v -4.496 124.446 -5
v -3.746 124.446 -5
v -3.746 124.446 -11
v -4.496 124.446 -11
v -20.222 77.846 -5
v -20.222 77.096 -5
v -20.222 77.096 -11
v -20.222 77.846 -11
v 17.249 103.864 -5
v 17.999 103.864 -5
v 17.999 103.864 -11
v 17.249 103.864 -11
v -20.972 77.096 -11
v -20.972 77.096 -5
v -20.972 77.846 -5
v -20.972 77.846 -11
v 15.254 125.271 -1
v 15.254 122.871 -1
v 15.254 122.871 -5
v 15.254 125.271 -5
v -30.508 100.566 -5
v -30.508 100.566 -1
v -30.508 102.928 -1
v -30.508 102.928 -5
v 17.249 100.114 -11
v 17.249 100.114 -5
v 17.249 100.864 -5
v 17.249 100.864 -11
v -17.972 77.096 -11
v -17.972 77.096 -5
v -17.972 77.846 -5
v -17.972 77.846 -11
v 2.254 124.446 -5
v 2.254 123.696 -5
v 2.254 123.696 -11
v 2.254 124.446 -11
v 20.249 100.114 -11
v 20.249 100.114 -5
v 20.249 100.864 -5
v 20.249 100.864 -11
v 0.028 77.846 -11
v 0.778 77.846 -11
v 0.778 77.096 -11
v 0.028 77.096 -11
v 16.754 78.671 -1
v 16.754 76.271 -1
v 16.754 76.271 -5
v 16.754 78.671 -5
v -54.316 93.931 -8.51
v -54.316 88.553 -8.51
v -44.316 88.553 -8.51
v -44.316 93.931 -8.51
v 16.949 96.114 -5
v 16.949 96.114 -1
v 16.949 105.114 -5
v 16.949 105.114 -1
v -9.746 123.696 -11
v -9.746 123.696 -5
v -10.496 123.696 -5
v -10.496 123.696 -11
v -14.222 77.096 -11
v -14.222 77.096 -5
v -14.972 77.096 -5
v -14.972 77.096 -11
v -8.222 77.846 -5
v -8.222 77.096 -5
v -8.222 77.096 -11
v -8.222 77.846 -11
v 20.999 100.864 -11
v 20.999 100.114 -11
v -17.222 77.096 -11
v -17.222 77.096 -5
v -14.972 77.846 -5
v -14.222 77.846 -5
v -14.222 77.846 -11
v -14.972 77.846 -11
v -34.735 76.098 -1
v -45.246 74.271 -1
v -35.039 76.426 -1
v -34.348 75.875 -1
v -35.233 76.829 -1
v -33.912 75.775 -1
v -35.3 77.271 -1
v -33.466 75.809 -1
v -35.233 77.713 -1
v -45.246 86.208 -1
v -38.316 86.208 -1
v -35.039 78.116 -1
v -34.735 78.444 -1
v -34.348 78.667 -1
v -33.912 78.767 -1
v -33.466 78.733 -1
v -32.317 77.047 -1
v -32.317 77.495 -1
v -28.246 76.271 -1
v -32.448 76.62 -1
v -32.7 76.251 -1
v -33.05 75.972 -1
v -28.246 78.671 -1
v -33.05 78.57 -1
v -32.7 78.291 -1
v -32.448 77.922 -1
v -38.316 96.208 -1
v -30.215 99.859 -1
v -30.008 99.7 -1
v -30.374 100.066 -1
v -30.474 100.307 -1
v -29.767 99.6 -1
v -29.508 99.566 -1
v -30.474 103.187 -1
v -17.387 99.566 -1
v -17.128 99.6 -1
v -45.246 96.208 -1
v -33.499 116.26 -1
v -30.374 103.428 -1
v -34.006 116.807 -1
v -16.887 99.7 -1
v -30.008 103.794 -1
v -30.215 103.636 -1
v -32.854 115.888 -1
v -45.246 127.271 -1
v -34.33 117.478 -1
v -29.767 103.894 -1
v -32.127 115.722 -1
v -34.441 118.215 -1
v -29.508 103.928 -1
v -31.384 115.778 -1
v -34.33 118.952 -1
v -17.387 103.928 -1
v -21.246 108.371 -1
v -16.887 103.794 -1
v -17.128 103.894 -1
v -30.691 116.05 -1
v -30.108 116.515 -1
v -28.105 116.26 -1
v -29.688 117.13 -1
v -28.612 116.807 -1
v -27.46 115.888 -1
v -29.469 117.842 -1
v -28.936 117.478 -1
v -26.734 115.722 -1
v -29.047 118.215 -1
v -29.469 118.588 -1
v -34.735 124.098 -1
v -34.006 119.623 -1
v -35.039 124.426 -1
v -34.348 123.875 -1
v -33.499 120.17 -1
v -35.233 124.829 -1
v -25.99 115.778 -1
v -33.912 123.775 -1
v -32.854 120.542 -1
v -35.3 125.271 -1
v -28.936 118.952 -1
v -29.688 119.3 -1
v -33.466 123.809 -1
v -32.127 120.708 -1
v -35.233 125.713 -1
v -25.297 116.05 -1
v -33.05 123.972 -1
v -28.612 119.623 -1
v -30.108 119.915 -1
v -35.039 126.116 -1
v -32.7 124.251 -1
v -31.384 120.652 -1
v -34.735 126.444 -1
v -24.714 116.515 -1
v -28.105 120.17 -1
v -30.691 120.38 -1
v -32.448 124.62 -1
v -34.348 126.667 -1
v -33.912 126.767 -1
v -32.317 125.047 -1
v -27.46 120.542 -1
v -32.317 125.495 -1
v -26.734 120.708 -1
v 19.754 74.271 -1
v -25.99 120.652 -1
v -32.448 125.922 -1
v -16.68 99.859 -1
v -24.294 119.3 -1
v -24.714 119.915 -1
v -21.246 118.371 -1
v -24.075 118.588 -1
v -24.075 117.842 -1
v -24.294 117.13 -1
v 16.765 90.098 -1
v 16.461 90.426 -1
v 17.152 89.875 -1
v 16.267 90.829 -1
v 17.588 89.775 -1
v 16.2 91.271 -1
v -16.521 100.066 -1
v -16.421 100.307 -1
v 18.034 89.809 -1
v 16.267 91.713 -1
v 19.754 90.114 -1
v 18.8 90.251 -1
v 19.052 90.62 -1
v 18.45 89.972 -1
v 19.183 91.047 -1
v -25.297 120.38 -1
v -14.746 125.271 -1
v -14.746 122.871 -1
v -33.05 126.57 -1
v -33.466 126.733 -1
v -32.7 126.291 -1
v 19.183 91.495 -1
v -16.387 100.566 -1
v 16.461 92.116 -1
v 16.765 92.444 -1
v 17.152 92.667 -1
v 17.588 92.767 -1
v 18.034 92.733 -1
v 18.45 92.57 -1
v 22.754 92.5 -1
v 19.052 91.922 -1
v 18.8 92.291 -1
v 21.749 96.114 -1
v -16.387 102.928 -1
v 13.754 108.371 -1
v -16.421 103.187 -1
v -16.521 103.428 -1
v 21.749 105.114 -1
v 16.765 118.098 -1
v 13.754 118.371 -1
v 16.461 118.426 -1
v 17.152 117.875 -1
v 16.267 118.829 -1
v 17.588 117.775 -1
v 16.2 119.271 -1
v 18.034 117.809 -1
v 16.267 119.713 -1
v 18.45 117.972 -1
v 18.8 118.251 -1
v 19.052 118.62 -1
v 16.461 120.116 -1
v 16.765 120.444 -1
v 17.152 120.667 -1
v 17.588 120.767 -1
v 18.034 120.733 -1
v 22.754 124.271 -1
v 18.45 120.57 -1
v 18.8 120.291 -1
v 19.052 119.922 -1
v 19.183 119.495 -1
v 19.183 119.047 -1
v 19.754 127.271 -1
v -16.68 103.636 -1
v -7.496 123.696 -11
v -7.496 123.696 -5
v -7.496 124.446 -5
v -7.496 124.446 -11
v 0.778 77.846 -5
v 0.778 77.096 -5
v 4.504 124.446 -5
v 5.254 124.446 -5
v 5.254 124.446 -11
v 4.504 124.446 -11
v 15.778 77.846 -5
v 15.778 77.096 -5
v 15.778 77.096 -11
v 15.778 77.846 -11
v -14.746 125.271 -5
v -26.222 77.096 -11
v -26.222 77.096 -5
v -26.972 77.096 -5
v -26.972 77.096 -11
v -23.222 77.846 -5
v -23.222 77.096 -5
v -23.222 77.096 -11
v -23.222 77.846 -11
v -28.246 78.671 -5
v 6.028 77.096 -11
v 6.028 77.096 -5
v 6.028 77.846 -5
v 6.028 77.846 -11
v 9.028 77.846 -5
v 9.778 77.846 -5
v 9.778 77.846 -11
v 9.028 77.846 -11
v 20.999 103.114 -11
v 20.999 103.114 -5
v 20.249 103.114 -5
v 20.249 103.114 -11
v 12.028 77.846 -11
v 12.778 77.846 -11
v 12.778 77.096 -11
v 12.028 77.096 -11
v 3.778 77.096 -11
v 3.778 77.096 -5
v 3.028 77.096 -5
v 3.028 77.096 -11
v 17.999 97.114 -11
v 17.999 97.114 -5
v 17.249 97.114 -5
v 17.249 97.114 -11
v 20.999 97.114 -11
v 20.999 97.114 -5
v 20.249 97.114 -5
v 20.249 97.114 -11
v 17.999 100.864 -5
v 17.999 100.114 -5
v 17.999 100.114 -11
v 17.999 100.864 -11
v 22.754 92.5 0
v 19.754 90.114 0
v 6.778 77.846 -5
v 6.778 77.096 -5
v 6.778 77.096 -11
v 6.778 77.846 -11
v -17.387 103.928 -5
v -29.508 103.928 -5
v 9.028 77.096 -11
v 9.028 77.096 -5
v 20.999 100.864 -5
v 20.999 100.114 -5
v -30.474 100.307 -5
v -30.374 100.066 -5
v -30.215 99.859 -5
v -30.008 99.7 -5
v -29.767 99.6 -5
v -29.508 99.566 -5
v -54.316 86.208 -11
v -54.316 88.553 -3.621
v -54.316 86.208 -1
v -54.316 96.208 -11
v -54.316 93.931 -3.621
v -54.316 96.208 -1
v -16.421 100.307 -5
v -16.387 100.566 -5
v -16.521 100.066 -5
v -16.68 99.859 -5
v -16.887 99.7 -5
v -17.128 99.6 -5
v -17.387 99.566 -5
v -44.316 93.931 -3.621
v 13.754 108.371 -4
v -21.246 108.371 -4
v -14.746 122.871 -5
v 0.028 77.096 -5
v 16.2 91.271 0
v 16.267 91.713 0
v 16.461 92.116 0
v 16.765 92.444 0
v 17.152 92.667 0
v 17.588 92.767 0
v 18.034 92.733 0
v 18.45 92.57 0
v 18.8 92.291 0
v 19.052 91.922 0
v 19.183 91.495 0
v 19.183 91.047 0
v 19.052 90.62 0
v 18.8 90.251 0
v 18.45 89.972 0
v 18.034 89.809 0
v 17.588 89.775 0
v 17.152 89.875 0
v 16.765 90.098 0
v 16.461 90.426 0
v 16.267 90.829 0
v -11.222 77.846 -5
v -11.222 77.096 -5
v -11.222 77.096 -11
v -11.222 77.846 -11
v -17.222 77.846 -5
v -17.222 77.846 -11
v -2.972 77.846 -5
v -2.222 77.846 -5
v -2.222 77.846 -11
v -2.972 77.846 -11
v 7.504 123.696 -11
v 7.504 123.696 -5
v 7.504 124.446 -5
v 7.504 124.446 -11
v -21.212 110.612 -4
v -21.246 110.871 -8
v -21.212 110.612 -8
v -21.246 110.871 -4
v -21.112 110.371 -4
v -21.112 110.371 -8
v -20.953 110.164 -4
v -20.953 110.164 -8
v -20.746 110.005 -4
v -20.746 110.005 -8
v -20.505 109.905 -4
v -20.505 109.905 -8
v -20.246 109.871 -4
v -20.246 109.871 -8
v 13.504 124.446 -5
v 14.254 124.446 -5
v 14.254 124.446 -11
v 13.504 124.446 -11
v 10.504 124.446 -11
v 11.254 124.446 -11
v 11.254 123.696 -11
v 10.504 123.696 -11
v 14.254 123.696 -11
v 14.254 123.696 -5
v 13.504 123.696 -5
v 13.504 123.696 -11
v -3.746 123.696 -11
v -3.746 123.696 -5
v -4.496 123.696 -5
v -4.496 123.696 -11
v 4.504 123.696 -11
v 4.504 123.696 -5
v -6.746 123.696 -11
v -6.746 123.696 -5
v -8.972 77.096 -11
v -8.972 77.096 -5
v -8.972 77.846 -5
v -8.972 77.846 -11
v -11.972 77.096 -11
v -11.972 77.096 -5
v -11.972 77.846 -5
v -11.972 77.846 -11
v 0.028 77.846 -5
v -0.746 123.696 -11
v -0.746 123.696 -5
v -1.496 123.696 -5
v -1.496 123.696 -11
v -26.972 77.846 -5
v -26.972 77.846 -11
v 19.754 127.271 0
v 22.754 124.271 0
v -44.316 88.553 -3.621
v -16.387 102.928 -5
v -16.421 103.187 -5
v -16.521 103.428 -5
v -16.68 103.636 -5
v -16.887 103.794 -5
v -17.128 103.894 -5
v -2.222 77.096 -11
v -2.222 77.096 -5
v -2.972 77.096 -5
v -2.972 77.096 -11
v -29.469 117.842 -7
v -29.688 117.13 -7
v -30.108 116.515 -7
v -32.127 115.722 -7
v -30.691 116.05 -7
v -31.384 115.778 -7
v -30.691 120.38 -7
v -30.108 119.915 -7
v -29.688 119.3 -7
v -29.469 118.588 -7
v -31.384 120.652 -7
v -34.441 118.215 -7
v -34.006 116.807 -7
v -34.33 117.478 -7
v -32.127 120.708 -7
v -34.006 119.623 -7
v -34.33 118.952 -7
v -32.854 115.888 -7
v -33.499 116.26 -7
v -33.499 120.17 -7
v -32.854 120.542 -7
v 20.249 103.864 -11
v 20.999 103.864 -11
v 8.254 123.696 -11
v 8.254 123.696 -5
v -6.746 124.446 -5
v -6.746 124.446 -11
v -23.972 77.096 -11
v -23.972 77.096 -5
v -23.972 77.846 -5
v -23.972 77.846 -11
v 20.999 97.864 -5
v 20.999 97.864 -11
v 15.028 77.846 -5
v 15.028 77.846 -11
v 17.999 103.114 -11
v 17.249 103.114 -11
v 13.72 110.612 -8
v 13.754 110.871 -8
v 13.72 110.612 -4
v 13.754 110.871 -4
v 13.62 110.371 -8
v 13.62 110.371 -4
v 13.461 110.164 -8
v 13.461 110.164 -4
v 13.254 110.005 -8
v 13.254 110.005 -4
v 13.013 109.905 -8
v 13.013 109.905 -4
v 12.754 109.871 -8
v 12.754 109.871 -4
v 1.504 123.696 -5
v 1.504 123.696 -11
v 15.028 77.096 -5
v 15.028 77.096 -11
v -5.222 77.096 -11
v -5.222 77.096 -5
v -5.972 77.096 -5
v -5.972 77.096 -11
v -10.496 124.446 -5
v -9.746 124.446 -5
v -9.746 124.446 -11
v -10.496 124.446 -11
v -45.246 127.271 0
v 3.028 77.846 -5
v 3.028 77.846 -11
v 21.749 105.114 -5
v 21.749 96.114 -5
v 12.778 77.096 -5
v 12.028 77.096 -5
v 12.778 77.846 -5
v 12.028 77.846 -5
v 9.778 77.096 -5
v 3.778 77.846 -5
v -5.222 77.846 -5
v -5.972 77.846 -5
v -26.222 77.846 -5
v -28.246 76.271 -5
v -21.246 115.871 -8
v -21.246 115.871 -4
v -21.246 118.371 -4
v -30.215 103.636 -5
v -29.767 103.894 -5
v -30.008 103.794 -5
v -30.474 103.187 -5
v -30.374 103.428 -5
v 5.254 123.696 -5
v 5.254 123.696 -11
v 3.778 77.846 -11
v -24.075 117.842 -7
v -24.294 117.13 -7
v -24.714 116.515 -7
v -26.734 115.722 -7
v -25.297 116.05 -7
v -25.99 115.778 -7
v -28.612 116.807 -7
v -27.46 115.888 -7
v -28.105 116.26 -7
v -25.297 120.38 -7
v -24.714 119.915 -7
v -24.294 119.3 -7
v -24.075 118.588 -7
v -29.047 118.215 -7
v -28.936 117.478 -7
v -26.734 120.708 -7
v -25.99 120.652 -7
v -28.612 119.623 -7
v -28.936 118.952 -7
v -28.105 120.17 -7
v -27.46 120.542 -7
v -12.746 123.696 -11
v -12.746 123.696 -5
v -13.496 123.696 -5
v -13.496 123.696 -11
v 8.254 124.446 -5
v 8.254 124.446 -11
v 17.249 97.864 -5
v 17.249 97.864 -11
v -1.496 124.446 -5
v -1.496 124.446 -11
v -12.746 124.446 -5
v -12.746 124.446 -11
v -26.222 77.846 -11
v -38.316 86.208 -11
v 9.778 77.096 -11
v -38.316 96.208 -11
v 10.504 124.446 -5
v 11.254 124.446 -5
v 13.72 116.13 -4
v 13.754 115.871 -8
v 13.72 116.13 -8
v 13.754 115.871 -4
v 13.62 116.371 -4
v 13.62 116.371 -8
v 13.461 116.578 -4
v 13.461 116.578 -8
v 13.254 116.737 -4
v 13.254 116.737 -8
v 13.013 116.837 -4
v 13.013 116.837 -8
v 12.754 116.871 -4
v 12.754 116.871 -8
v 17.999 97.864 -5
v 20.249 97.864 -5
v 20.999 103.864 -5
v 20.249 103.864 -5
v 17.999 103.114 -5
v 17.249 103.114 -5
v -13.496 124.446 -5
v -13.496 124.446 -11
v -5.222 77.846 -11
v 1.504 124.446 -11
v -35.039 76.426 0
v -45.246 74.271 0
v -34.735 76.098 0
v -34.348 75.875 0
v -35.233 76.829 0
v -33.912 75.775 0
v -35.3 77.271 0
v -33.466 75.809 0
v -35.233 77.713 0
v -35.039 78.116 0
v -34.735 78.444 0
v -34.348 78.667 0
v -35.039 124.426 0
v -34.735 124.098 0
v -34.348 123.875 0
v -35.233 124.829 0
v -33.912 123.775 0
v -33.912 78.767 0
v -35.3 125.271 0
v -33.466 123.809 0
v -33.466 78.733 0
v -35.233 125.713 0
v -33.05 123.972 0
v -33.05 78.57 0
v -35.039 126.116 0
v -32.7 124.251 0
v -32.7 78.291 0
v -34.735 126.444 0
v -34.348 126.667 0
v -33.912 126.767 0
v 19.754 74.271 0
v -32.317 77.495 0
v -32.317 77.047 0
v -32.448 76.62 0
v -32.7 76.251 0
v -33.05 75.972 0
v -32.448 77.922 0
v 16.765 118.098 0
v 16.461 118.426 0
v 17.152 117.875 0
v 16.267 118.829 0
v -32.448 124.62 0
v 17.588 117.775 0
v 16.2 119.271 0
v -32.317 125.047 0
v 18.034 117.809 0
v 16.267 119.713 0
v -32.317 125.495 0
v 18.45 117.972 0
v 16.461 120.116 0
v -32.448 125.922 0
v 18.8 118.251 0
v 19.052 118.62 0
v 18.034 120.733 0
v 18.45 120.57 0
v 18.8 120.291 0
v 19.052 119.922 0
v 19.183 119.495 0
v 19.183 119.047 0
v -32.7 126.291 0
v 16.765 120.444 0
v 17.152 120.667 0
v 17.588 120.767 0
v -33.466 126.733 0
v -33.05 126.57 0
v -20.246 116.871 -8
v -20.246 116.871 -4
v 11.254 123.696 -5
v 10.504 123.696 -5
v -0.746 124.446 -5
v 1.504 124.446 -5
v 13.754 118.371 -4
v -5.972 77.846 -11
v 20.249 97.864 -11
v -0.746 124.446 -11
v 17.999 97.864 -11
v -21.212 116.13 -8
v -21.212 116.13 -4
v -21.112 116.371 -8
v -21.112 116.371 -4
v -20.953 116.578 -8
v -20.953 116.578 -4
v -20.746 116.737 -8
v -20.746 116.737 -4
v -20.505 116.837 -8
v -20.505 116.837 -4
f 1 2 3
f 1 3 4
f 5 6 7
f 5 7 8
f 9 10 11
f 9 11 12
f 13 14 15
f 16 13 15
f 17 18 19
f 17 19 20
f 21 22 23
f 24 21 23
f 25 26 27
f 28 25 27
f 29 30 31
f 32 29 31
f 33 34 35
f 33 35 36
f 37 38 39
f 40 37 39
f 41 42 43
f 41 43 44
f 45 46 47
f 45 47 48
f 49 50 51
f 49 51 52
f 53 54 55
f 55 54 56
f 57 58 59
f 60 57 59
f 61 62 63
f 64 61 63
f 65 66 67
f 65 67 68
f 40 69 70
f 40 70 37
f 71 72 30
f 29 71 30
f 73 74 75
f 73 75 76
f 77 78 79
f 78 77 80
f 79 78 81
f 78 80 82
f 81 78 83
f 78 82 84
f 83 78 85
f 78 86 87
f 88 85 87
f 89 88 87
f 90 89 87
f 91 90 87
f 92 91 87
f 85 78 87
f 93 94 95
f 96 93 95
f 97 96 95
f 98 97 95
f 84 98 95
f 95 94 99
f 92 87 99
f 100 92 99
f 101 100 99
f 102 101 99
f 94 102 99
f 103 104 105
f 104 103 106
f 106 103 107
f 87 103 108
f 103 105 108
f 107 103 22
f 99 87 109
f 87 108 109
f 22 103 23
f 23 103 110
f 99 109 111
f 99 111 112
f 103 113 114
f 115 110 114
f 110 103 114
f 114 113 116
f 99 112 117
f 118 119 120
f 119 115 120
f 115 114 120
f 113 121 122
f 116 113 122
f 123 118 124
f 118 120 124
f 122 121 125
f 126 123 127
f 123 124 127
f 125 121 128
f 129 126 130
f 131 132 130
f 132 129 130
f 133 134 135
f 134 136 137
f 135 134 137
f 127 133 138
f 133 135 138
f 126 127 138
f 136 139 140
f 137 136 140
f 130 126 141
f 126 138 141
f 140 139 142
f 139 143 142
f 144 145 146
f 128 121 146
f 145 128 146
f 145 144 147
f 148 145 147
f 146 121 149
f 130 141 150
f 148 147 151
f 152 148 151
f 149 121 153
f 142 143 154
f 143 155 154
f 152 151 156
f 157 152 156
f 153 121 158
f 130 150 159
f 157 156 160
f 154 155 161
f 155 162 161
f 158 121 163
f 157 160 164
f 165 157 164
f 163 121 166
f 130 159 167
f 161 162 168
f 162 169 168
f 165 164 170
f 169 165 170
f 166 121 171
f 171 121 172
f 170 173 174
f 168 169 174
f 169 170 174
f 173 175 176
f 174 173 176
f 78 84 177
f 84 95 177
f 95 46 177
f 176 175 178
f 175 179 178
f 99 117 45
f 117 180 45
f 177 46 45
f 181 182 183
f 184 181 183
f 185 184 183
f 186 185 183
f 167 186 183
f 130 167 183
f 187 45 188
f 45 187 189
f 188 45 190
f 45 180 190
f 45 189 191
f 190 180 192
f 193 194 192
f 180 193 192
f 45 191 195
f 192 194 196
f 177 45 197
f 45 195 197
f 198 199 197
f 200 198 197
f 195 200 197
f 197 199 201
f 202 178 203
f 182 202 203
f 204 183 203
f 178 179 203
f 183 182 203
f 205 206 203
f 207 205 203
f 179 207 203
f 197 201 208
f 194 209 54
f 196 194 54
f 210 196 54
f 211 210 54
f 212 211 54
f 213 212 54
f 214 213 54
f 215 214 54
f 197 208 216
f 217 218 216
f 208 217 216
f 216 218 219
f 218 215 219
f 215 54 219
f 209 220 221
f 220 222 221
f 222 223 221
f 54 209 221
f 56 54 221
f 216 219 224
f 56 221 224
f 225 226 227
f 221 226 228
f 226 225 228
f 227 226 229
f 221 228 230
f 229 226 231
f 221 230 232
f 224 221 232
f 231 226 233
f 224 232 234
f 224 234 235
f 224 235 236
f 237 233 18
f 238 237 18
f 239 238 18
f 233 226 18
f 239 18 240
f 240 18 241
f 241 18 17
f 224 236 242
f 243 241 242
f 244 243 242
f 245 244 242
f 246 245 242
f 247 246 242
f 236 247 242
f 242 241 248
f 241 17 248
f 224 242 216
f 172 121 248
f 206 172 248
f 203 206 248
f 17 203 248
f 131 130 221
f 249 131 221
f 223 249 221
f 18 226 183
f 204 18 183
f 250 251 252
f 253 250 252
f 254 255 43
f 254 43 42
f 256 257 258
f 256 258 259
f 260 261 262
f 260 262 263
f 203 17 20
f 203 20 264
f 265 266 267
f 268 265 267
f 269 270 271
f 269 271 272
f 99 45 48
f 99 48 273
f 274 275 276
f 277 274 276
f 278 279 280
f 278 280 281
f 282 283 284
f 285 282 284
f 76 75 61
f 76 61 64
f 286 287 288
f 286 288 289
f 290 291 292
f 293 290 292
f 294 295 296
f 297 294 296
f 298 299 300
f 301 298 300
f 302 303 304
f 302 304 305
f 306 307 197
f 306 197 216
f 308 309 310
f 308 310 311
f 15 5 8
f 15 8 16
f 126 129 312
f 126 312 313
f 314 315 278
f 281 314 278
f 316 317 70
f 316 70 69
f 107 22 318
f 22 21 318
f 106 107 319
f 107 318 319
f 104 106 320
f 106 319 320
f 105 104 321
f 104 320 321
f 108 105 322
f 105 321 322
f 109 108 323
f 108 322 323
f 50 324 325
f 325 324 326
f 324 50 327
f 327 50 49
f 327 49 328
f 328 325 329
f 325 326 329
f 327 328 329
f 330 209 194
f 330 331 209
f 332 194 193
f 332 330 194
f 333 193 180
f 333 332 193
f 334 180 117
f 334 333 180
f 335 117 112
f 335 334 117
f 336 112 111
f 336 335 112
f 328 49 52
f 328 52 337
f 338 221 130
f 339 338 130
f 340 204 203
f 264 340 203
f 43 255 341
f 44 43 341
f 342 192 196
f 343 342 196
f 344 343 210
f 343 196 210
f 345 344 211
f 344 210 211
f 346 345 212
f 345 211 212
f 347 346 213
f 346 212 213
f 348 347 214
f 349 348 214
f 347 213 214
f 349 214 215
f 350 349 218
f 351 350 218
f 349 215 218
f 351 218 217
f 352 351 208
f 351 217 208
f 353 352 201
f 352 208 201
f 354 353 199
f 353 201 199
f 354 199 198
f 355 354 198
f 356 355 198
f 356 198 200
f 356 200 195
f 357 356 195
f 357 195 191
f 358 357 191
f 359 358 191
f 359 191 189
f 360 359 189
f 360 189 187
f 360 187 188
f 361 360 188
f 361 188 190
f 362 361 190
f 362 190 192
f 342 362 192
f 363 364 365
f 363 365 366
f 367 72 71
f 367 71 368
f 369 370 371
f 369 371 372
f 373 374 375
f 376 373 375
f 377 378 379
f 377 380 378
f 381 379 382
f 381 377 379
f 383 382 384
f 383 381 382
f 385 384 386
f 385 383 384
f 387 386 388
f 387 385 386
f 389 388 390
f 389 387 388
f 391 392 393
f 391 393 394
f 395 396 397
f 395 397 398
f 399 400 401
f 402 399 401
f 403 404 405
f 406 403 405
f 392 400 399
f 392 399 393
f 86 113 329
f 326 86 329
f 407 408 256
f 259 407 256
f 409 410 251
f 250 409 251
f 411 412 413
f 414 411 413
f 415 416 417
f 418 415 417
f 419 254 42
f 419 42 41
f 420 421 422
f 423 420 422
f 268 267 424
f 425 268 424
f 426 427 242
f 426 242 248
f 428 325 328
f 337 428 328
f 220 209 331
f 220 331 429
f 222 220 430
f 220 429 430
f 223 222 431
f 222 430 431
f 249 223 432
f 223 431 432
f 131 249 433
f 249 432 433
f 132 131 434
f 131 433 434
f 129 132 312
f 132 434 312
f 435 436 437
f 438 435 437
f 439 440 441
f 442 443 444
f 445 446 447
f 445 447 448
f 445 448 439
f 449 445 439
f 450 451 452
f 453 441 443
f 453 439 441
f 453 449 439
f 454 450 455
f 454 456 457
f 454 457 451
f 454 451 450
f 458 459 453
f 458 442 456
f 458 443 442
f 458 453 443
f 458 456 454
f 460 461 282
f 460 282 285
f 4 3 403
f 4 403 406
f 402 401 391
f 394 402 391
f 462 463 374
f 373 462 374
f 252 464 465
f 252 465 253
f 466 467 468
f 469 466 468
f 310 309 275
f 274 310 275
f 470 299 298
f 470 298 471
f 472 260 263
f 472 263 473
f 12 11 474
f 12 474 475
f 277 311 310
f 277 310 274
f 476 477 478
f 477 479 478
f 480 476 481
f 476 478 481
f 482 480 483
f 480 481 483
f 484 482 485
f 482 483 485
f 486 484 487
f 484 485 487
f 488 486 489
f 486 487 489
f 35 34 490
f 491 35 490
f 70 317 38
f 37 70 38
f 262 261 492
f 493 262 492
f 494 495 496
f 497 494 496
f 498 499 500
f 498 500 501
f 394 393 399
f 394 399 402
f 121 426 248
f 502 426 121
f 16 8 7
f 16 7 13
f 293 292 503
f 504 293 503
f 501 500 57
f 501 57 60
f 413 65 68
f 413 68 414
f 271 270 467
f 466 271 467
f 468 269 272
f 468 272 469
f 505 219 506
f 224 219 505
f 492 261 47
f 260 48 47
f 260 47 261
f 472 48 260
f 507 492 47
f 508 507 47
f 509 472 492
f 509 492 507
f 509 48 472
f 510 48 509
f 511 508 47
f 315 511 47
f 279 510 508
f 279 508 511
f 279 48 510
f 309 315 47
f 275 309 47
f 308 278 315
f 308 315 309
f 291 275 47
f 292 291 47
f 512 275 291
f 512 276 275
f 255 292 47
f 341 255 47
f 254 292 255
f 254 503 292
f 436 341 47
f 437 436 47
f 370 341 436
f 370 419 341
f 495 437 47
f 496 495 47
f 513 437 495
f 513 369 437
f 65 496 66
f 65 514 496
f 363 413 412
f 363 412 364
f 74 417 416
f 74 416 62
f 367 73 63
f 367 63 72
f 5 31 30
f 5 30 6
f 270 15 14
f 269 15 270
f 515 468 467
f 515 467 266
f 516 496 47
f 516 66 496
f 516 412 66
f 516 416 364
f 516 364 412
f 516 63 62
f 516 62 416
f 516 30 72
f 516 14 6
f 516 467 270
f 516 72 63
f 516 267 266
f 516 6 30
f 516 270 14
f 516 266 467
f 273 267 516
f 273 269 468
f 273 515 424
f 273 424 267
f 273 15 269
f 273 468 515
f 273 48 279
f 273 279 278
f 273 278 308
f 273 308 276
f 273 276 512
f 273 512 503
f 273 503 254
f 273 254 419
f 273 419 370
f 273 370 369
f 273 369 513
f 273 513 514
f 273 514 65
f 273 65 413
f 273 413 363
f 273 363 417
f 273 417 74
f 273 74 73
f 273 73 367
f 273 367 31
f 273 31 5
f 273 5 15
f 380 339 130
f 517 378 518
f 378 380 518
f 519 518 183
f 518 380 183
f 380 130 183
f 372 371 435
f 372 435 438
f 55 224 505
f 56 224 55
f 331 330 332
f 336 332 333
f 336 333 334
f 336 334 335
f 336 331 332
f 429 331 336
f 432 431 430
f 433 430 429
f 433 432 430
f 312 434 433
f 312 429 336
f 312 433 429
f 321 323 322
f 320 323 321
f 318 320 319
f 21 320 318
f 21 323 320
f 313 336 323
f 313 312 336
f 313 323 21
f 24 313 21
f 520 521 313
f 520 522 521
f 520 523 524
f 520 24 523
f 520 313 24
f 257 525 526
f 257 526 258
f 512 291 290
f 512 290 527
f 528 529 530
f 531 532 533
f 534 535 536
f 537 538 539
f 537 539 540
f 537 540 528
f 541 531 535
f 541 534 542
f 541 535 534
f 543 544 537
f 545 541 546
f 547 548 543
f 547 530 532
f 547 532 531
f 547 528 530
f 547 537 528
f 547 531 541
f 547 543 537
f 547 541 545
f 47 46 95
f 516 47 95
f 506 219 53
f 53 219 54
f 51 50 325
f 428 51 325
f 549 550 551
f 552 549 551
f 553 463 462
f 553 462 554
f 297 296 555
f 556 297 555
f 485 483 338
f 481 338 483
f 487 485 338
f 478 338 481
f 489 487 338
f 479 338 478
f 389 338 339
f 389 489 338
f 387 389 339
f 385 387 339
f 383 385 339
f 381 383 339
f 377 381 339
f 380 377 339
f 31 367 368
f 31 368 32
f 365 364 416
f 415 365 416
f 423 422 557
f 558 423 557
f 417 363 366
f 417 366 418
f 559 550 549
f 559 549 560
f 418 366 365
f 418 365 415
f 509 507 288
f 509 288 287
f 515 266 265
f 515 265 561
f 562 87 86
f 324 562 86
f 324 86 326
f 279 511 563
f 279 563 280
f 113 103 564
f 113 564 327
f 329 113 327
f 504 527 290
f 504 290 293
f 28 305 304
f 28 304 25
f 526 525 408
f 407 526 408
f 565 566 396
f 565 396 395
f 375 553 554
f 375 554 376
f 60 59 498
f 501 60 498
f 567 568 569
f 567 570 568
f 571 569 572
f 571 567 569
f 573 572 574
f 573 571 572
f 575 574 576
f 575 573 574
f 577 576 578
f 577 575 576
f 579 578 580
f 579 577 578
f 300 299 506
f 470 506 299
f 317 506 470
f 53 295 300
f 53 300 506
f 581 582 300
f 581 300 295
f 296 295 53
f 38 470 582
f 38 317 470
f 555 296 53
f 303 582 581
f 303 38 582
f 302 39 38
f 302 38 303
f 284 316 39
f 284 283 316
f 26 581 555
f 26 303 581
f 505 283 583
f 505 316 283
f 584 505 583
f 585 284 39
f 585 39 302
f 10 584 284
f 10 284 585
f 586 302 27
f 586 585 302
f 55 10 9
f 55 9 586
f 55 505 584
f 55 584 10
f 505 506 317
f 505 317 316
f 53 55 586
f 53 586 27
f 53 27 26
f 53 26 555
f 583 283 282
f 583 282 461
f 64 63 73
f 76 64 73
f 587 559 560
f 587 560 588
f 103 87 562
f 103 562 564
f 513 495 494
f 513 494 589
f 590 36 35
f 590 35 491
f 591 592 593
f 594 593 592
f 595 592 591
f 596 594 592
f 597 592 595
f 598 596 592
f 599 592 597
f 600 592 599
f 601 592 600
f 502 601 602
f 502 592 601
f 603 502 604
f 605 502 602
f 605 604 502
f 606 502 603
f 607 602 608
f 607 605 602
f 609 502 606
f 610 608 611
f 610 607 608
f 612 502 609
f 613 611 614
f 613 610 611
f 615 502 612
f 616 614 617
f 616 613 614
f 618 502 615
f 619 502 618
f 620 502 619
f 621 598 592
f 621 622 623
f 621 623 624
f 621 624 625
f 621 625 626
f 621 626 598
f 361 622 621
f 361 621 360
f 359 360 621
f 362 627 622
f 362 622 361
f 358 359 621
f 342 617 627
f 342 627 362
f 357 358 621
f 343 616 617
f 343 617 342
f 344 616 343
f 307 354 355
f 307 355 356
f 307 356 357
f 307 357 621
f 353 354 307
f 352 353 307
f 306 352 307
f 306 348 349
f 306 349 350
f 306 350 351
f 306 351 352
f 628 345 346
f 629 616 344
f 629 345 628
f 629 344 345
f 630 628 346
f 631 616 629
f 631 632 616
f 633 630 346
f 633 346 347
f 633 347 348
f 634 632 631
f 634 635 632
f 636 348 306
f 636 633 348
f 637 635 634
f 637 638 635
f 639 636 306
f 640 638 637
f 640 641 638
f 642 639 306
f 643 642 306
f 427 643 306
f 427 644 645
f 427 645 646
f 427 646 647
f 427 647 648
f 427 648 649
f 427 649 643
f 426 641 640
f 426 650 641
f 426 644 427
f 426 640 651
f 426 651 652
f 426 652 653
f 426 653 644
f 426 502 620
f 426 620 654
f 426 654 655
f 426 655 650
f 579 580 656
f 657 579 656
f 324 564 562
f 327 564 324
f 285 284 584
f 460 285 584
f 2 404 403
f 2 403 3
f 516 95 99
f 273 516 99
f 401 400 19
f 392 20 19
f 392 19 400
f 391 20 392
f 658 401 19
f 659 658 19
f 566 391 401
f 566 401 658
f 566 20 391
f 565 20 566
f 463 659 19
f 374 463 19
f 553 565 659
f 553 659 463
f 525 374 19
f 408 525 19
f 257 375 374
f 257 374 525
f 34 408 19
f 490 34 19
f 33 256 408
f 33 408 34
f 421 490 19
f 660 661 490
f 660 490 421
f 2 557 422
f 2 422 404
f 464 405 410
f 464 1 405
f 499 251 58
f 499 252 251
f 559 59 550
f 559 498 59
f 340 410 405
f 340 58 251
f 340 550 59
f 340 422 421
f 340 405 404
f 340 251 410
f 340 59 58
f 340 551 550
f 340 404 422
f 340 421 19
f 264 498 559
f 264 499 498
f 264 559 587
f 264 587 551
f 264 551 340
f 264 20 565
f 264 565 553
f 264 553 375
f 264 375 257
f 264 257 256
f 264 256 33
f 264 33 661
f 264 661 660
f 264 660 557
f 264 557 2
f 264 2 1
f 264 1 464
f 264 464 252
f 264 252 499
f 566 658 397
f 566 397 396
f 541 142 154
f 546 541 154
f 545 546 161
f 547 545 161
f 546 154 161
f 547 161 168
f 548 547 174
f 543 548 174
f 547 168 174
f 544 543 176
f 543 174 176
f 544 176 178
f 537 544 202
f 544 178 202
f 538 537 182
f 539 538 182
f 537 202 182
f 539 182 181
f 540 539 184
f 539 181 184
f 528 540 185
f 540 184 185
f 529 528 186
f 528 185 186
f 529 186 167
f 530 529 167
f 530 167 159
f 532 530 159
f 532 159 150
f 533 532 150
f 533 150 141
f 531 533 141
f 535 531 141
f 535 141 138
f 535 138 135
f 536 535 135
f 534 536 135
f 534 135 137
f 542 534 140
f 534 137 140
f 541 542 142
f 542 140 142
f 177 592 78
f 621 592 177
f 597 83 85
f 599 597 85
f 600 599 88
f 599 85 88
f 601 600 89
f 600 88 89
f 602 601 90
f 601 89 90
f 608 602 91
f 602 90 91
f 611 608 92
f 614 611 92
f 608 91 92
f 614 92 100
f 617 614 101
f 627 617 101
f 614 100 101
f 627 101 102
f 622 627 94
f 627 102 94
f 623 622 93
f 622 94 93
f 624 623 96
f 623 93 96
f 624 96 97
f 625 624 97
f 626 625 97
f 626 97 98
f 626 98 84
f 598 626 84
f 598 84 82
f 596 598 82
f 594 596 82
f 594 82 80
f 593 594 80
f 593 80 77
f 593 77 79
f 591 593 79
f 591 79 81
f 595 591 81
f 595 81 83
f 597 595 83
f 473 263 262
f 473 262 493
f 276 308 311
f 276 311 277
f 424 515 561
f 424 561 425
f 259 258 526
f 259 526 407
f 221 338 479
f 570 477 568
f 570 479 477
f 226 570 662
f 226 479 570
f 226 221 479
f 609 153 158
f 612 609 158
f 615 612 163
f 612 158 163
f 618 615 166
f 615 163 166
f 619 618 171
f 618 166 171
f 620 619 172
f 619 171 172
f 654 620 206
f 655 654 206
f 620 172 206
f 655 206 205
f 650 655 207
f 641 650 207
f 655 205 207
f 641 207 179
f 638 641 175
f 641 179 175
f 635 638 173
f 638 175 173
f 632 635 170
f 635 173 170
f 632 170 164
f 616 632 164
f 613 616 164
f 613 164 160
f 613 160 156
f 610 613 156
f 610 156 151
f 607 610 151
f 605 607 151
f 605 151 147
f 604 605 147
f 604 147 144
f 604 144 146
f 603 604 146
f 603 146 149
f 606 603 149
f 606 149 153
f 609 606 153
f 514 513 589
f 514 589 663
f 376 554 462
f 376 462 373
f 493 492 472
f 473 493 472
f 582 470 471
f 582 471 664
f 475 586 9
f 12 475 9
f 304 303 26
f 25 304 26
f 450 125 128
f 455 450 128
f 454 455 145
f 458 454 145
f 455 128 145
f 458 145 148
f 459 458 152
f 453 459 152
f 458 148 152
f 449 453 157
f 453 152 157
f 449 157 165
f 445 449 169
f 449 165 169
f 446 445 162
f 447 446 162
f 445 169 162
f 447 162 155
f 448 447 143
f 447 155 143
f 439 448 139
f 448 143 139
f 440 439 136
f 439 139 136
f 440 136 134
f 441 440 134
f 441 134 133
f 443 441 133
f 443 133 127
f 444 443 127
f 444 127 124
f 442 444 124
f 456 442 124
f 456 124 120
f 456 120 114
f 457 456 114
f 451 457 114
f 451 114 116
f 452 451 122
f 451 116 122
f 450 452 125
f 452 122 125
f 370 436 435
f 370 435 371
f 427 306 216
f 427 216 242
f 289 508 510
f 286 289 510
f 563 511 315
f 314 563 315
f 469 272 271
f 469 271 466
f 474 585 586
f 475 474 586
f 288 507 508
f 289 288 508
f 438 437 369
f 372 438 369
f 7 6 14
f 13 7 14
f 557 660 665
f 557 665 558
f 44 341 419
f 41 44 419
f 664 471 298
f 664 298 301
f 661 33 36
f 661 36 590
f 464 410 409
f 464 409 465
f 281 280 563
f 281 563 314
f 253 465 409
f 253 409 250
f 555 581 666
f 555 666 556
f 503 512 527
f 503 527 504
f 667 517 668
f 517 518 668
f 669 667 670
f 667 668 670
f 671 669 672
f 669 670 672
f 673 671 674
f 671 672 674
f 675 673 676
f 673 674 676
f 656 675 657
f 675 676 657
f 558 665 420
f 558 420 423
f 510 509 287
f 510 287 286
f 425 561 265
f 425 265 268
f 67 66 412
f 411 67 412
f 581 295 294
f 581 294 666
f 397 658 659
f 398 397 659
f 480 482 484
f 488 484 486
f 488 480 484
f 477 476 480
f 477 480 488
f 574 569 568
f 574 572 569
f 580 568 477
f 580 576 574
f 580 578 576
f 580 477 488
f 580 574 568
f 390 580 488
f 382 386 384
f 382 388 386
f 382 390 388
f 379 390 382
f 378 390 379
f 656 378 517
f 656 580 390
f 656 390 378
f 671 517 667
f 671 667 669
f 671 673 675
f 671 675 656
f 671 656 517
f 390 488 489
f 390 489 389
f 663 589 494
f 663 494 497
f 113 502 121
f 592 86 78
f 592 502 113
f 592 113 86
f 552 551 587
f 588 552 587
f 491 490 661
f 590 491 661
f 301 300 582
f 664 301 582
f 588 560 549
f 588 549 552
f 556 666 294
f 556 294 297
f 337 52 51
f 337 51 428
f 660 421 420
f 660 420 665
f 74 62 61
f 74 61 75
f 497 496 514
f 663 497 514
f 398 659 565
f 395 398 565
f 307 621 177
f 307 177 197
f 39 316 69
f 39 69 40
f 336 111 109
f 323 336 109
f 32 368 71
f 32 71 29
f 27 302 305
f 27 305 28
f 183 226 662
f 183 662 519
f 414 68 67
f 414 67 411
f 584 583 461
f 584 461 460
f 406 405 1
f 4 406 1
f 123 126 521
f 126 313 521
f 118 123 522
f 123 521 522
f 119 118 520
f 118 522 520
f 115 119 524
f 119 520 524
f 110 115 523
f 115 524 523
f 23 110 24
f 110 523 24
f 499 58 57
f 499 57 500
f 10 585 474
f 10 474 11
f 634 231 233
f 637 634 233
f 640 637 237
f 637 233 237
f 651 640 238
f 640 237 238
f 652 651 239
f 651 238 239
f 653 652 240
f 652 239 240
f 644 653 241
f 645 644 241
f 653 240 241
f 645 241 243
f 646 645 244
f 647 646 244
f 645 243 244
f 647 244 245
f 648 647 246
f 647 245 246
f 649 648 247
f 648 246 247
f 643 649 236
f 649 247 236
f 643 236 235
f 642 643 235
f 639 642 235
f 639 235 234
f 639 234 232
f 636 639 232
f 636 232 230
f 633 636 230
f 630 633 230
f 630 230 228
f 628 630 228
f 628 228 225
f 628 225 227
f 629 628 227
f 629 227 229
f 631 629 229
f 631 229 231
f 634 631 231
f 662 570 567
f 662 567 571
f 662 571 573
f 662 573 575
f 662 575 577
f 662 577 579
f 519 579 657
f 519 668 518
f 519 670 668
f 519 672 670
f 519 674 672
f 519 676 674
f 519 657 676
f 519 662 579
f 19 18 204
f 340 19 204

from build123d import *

# Parameters (mm, degrees)
BOSS_EXTRUDE1_DEPTH  = 1
SKETCH2_W            = 16
SKETCH2_H            = 10
BOSS_EXTRUDE2_DEPTH  = 10
SKETCH3_W            = 4.889113018
SKETCH3_H            = 5.37802432
CUT_EXTRUDE1_DEPTH   = 10
SKETCH4_W            = 45
SKETCH4_H            = 2.4
SKETCH4_W_2          = 30
BOSS_EXTRUDE3_DEPTH  = 4
SKETCH5_W            = 35
SKETCH5_H            = 10
BOSS_EXTRUDE4_DEPTH  = 7
SKETCH6_W            = 35
SKETCH6_H            = 1.5
CUT_EXTRUDE2_DEPTH   = 4
FILLET1_R            = 1
SKETCH7_R            = 1.5
CUT_EXTRUDE3_DEPTH   = 4
SKETCH8_W            = 0.75
SKETCH8_H            = 0.75
BOSS_EXTRUDE5_DEPTH  = 6
LPATTERN1_COUNT      = 10
LPATTERN1_PITCH      = 3
SKETCH9_W            = 0.75
SKETCH9_H            = 0.75
BOSS_EXTRUDE6_DEPTH  = 6
LPATTERN2_COUNT      = 15
LPATTERN2_PITCH      = 3
SKETCH10_R           = 2.5
BOSS_EXTRUDE7_DEPTH  = 6
SKETCH11_W           = 4.8
SKETCH11_H           = 9
BOSS_EXTRUDE8_DEPTH  = 4
SKETCH12_W           = 0.75
SKETCH12_H           = 0.75
BOSS_EXTRUDE9_DEPTH  = 6
LPATTERN3_COUNT      = 3
LPATTERN3_PITCH      = 3
LPATTERN3_COUNT_DIR2 = 2
LPATTERN3_PITCH_DIR2 = 3
SKETCH13_W           = 14.120912951
SKETCH13_H           = 4.362558473
BOSS_EXTRUDE10_DEPTH = 4
FILLET2_R            = 1


with BuildPart() as part:
    # Sketch1 → Boss-Extrude1 (new body)
    with BuildSketch(Plane.XY):
        Polygon((22.754016647, 124.270947632), (19.754016647, 127.270947632), (-45.245983353, 127.270947632), (-45.245983353, 74.270947632), (19.754016647, 74.270947632), (19.754016647, 90.113910289), (22.754016647, 92.500164177), align=None)
    extrude(amount=-BOSS_EXTRUDE1_DEPTH)

    # Sketch2 → Boss-Extrude2 (add)
    with BuildSketch(Plane(origin=(0, 0, -1), x_dir=(-1, 0, 0), z_dir=(0, 0, -1))):
        with Locations((46.316496684, 91.208096568)):
            Rectangle(SKETCH2_W, SKETCH2_H)
    extrude(amount=BOSS_EXTRUDE2_DEPTH)

    # Sketch3 → Cut-Extrude1 (cut)
    with BuildSketch(Plane.ZY.offset(54.316496684)):
        with Locations((-6.06540843, 91.2419286)):
            Rectangle(SKETCH3_W, SKETCH3_H)
    extrude(amount=-CUT_EXTRUDE1_DEPTH, mode=Mode.SUBTRACT)

    # Sketch4 → Boss-Extrude3 (add)
    with BuildSketch(Plane(origin=(0, 0, -1), x_dir=(-1, 0, 0), z_dir=(0, 0, -1))):
        with Locations((5.745983353, 77.470947632)):
            Rectangle(SKETCH4_W, SKETCH4_H)
        with Locations((-0.254016647, 124.070947632)):
            Rectangle(SKETCH4_W_2, SKETCH4_H)
    extrude(amount=BOSS_EXTRUDE3_DEPTH)

    # Sketch5 → Boss-Extrude4 (add)
    with BuildSketch(Plane(origin=(0, 0, -1), x_dir=(-1, 0, 0), z_dir=(0, 0, -1))):
        with Locations((3.745983353, 113.370947632)):
            Rectangle(SKETCH5_W, SKETCH5_H)
    extrude(amount=BOSS_EXTRUDE4_DEPTH)

    # Sketch6 → Cut-Extrude2 (cut)
    with BuildSketch(Plane(origin=(0, 0, -8), x_dir=(-1, 0, 0), z_dir=(0, 0, -1))):
        with Locations((3.745983353, 117.620947632)):
            Rectangle(SKETCH6_W, SKETCH6_H)
        with Locations((3.745983353, 109.120947632)):
            Rectangle(SKETCH6_W, SKETCH6_H)
    extrude(amount=-CUT_EXTRUDE2_DEPTH, mode=Mode.SUBTRACT)

    # Fillet1
    fillet1_edges = [part.edges().sort_by_distance(p)[0] for p in [
        (13.754016647, 109.870947632, -6),
        (-21.245983353, 109.870947632, -6),
        (13.754016647, 116.870947632, -6),
        (-21.245983353, 116.870947632, -6),
    ]]
    fillet(fillet1_edges, radius=FILLET1_R)

    # Sketch7 → Cut-Extrude3 (cut)
    with BuildSketch(Plane(origin=(0, 0, -1), x_dir=(-1, 0, 0), z_dir=(0, 0, -1))):
        with Locations((-17.700101194, 119.270947632)):
            Circle(SKETCH7_R)
        with Locations((-17.700101194, 91.270947632)):
            Circle(SKETCH7_R)
        with Locations((33.799898806, 125.270947632)):
            Circle(SKETCH7_R)
        with Locations((33.799898806, 77.270947632)):
            Circle(SKETCH7_R)
    extrude(amount=-CUT_EXTRUDE3_DEPTH, mode=Mode.SUBTRACT)

    # Sketch8 → Boss-Extrude5 (add)
    with BuildSketch(Plane(origin=(0, 0, -5), x_dir=(-1, 0, 0), z_dir=(0, 0, -1))):
        with Locations((-13.879016647, 124.070947632)):
            Rectangle(SKETCH8_W, SKETCH8_H)
    boss_extrude5 = extrude(amount=BOSS_EXTRUDE5_DEPTH)

    # LPattern1: Boss-Extrude5 ×10
    with Locations(*[(-i * LPATTERN1_PITCH, 0, 0) for i in range(1, LPATTERN1_COUNT)]):
        add(boss_extrude5)

    # Sketch9 → Boss-Extrude6 (add)
    with BuildSketch(Plane(origin=(0, 0, -5), x_dir=(-1, 0, 0), z_dir=(0, 0, -1))):
        with Locations((-15.402792453, 77.470947632)):
            Rectangle(SKETCH9_W, SKETCH9_H)
    boss_extrude6 = extrude(amount=BOSS_EXTRUDE6_DEPTH)

    # LPattern2: Boss-Extrude6 ×15
    with Locations(*[(-i * LPATTERN2_PITCH, 0, 0) for i in range(1, LPATTERN2_COUNT)]):
        add(boss_extrude6)

    # Sketch10 → Boss-Extrude7 (add)
    with BuildSketch(Plane(origin=(0, 0, -1), x_dir=(-1, 0, 0), z_dir=(0, 0, -1))):
        with Locations((26.546732083, 118.214976991)):
            Circle(SKETCH10_R)
        with Locations((31.940661119, 118.214976991)):
            Circle(SKETCH10_R)
    extrude(amount=BOSS_EXTRUDE7_DEPTH)

    # Sketch11 → Boss-Extrude8 (add)
    with BuildSketch(Plane(origin=(0, 0, -1), x_dir=(-1, 0, 0), z_dir=(0, 0, -1))):
        with Locations((-19.349242758, 100.613910289)):
            Rectangle(SKETCH11_W, SKETCH11_H)
    extrude(amount=BOSS_EXTRUDE8_DEPTH)

    # Sketch12 → Boss-Extrude9 (add)
    with BuildSketch(Plane(origin=(0, 0, -5), x_dir=(-1, 0, 0), z_dir=(0, 0, -1))):
        with Locations((-20.624242758, 97.488910289)):
            Rectangle(SKETCH12_W, SKETCH12_H)
    boss_extrude9 = extrude(amount=BOSS_EXTRUDE9_DEPTH)

    # LPattern3: Boss-Extrude9 3 × 2
    with Locations(*[(-j * LPATTERN3_PITCH_DIR2, i * LPATTERN3_PITCH, 0) for i in range(LPATTERN3_COUNT) for j in range(LPATTERN3_COUNT_DIR2) if (i, j) != (0, 0)]):
        add(boss_extrude9)

    # Sketch13 → Boss-Extrude10 (add)
    with BuildSketch(Plane(origin=(0, 0, -1), x_dir=(-1, 0, 0), z_dir=(0, 0, -1))):
        with Locations((23.447660741, 101.747194556)):
            Rectangle(SKETCH13_W, SKETCH13_H)
    extrude(amount=BOSS_EXTRUDE10_DEPTH)

    # Fillet2
    fillet2_edges = [part.edges().sort_by_distance(p)[0] for p in [
        (-16.387204265, 103.928473792, -3),
        (-16.387204265, 99.565915319, -3),
        (-30.508117216, 99.565915319, -3),
        (-30.508117216, 103.928473792, -3),
    ]]
    fillet(fillet2_edges, radius=FILLET2_R)


solid = part.part
